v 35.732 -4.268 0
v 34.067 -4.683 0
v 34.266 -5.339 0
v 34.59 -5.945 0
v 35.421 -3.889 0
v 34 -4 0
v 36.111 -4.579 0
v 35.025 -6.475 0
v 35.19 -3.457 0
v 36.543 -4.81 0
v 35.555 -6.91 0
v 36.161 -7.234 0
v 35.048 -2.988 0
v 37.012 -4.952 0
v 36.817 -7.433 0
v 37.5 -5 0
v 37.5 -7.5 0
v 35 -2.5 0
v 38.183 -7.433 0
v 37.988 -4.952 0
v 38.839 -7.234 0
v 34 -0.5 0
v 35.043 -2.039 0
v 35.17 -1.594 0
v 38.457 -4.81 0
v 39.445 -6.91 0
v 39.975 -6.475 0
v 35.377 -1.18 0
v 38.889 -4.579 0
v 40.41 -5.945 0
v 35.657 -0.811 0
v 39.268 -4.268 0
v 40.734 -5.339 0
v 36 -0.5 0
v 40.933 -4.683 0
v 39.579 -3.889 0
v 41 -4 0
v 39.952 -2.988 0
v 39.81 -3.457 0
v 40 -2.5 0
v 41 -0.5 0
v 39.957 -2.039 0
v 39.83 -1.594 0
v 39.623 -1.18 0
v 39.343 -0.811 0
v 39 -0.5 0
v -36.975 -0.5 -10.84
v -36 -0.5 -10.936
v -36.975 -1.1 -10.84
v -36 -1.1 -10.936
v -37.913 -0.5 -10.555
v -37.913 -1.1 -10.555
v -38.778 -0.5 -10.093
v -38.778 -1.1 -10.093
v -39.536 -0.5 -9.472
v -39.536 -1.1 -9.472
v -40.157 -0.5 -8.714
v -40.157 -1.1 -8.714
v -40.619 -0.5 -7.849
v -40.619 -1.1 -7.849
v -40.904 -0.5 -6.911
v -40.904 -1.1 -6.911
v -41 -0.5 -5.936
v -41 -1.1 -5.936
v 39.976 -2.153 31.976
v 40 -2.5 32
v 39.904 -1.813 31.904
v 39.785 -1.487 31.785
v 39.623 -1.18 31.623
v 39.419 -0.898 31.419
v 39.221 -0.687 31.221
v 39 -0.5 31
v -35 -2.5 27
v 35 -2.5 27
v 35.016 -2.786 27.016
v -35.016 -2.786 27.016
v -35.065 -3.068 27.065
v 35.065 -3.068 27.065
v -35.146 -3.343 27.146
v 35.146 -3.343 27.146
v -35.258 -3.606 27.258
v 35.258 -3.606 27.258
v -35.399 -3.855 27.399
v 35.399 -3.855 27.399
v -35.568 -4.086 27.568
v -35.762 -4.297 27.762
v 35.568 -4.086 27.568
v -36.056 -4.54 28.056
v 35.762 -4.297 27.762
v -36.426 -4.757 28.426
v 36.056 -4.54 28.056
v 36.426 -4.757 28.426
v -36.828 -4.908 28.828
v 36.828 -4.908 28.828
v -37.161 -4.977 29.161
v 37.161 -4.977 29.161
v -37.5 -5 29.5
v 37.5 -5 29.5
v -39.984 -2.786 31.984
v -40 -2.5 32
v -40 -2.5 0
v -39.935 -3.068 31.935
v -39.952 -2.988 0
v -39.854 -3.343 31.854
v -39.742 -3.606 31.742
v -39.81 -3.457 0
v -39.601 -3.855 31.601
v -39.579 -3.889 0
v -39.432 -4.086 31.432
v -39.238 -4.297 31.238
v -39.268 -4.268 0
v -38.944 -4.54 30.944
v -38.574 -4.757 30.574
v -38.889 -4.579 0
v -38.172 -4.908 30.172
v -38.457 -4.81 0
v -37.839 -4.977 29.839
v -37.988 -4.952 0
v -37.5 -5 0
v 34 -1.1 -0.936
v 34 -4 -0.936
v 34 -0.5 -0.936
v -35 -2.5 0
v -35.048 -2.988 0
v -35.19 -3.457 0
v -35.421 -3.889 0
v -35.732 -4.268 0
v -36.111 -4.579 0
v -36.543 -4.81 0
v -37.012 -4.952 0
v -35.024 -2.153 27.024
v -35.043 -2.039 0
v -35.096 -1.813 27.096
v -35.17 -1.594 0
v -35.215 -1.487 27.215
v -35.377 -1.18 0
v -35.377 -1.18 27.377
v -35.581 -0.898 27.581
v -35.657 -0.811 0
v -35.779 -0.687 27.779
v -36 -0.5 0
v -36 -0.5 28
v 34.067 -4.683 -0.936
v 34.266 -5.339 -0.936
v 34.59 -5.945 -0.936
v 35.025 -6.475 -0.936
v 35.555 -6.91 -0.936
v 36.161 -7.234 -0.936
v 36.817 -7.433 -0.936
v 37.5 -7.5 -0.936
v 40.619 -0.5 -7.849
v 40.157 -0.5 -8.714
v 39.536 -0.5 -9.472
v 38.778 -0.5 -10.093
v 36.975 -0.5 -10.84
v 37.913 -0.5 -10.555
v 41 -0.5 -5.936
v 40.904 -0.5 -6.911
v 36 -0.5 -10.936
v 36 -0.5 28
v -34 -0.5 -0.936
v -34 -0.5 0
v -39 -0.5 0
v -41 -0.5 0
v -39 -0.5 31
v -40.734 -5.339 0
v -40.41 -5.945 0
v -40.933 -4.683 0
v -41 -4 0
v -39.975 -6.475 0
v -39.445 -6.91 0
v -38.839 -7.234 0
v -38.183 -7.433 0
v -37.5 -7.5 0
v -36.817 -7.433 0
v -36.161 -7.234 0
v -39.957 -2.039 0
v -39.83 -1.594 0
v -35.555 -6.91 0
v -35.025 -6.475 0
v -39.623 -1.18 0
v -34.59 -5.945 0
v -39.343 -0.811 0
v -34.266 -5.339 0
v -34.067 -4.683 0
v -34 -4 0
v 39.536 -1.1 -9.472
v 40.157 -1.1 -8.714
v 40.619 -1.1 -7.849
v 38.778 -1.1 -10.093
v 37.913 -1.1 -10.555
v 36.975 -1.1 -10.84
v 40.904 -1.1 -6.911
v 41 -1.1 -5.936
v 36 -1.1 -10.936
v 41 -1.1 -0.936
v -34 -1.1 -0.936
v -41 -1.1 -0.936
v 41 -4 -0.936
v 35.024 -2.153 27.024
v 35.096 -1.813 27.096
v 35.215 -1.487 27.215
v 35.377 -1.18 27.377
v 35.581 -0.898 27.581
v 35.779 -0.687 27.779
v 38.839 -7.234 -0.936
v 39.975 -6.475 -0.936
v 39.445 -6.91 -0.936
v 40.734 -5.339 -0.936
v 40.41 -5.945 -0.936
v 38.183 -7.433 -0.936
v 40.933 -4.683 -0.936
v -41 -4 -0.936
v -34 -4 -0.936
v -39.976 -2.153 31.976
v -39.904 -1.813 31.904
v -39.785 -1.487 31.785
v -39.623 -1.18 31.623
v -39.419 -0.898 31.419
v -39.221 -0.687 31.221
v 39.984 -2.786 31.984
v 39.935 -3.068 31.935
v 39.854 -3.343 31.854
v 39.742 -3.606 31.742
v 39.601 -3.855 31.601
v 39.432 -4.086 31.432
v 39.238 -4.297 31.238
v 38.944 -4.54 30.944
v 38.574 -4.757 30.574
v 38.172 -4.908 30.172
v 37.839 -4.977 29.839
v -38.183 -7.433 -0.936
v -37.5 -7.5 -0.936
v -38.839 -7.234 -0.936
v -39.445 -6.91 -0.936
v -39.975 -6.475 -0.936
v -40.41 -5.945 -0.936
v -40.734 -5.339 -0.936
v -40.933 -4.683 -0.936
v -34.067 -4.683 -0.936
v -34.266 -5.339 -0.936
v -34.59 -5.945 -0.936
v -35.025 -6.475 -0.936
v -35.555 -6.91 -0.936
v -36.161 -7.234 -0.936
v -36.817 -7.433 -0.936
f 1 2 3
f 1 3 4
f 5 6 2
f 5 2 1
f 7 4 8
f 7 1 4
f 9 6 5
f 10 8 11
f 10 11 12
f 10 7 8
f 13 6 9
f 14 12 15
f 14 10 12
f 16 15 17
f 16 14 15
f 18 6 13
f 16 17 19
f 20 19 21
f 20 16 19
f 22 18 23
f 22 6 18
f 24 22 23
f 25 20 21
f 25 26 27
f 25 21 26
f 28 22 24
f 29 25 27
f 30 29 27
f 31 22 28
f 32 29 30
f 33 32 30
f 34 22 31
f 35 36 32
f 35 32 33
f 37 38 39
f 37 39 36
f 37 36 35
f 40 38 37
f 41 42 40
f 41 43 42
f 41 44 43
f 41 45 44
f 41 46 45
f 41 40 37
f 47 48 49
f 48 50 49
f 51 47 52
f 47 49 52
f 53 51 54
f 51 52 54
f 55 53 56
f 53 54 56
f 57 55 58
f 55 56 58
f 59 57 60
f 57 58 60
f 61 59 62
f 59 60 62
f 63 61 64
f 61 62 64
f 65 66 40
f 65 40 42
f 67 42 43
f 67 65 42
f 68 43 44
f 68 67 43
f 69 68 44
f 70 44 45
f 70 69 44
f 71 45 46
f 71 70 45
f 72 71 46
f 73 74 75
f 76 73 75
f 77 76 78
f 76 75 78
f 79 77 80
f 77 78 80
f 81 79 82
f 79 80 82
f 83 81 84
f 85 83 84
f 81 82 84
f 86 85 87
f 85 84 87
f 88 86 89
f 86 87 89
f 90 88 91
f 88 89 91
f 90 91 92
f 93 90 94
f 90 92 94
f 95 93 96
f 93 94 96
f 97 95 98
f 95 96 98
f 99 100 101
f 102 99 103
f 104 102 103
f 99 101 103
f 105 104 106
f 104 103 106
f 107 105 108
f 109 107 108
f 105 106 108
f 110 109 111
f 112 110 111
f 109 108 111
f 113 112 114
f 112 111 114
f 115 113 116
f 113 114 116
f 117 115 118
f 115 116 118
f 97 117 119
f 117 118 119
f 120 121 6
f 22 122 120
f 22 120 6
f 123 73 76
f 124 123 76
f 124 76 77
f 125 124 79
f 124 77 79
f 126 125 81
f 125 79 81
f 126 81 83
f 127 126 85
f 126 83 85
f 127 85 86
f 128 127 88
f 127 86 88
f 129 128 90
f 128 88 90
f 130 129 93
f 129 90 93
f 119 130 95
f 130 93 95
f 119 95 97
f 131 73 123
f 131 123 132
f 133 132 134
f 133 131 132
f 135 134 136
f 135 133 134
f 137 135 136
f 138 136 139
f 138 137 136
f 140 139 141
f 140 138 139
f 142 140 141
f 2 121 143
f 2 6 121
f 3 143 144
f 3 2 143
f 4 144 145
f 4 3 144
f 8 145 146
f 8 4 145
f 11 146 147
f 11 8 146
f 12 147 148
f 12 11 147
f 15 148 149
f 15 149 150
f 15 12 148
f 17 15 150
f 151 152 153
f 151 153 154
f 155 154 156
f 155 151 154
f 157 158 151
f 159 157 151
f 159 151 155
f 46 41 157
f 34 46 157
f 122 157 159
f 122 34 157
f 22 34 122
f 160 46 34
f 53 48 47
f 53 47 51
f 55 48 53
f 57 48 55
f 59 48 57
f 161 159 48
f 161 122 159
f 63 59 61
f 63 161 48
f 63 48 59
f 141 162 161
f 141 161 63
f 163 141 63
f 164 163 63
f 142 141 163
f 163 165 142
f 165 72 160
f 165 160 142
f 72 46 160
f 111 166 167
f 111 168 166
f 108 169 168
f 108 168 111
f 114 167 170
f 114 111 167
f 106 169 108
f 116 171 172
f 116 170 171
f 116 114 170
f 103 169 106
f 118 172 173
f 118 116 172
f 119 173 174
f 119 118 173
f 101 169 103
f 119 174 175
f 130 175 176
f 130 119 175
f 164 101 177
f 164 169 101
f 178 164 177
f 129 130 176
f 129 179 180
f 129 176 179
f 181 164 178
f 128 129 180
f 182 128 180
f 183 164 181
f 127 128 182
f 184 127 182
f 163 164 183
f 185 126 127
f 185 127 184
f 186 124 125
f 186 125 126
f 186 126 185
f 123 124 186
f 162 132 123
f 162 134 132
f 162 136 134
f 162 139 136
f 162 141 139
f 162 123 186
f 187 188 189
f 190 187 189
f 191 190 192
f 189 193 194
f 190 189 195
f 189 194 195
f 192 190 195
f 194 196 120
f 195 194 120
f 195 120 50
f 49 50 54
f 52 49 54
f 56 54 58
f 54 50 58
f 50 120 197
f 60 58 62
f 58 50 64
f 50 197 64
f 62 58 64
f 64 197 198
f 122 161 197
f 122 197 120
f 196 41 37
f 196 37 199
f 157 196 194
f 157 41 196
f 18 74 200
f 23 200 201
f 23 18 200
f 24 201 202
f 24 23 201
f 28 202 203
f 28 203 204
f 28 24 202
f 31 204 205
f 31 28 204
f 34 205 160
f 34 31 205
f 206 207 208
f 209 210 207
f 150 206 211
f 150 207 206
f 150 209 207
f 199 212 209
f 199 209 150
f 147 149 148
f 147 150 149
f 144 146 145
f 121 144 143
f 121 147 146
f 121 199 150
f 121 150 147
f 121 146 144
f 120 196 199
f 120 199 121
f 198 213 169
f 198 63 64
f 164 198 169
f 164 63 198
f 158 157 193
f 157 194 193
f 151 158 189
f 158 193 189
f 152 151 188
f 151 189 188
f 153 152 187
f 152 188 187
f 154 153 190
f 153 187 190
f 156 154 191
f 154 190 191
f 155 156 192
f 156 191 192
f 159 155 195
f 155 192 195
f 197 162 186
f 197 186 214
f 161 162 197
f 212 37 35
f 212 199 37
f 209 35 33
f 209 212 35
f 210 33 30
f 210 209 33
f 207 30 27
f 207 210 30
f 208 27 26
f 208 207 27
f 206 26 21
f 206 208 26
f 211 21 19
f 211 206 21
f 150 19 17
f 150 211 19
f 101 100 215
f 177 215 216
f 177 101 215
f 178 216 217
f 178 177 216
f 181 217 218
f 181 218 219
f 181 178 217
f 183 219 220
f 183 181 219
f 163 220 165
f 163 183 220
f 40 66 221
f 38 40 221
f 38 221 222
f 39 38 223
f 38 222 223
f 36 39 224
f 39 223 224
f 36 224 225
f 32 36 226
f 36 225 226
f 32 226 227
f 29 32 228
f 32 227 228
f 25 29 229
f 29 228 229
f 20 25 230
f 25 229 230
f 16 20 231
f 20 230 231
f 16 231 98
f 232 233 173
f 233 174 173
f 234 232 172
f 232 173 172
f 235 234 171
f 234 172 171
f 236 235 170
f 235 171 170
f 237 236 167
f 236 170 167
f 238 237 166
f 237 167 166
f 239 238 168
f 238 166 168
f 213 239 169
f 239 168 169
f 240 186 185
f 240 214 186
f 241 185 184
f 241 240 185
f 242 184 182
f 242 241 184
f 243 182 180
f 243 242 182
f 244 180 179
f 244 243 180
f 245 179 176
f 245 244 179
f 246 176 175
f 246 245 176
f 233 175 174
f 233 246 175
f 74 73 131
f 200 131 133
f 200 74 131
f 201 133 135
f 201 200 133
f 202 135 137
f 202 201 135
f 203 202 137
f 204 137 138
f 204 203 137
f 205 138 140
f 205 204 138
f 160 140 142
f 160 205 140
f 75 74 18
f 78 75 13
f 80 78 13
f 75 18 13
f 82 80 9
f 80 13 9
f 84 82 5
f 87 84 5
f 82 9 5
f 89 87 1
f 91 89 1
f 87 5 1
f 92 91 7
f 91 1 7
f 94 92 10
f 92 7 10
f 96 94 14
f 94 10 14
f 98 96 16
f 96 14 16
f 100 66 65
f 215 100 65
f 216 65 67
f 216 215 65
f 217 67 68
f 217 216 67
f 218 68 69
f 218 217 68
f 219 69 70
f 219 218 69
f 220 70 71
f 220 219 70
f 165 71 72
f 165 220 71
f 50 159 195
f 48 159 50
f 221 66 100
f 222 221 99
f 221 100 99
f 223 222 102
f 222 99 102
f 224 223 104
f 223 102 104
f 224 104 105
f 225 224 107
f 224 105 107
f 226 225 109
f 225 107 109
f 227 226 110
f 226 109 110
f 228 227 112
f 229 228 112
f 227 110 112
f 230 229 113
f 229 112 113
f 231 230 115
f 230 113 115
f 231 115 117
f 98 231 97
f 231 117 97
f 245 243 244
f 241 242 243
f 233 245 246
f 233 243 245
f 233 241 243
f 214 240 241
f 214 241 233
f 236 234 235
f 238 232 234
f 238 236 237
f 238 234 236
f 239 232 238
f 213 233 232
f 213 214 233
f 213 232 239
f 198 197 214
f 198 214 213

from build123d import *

# Parameters (mm, degrees)
F2_DEPTH = 5
F3_R     = 2.49999
F4_W     = 80
F4_H     = 32
F5_DEPTH = 0.5
F7_DEPTH = 7
F8_DEPTH = 0.6
F9_R     = 3.49999
F10_R    = 5


# Not quite as in the source:
# - a fillet or chamfer is up to 0.001 mm smaller than in the source, because OpenCascade refuses the exact size


with BuildPart() as f2:
    # F1 (on Front) → F2 (new body)
    with BuildSketch(Plane.XZ):
        Polygon((-40, 32), (-40, 0), (-35, 0), (-35, 27), (35, 27), (35, 0), (40, 0), (40, 32), align=None)
    extrude(amount=F2_DEPTH)

    # F3 (radius 2.5 in the source; OpenCascade refuses exactly that, so slightly less here)
    f3_edges = [f2.edges().sort_by_distance(p)[0] for p in [
        (-35, -5, 13.5),
        (-35, 0, 13.5),
        (40, -5, 16),
        (40, 0, 16),
        (35, -5, 13.5),
        (35, 0, 13.5),
        (0, 0, 27),
        (0, 0, 32),
        (-40, 0, 16),
        (0, -5, 32),
        (-40, -5, 16),
        (0, -5, 27),
    ]]
    fillet(f3_edges, radius=F3_R)

    # F4 (on Front) → F5 (cut)
    with BuildSketch(Plane.XZ):
        with Locations((0, 16)):
            Rectangle(F4_W, F4_H)
    extrude(amount=F5_DEPTH, mode=Mode.SUBTRACT)

    # F6 (on face) → F7 (join)
    with BuildSketch(Plane(origin=(0, -0.5, 0), x_dir=(-1, 0, 0), z_dir=(0, 1, 0))):
        Polygon((-35.9999933333, 0), (-37.5, 0), (-39.0000066667, 0), (-41, 0), (-41, -0.936), (-34, -0.936), (-34, 0), align=None)
        Polygon((41, 0), (39.0000066667, 0), (37.5, 0), (35.9999933333, 0), (34, 0), (34, -0.936), (41, -0.936), align=None)
    extrude(amount=-F7_DEPTH)

    # F6 (on face) → F8 (join)
    with BuildSketch(Plane(origin=(0, -0.5, 0), x_dir=(-1, 0, 0), z_dir=(0, 1, 0))):
        Polygon((-34, -0.936), (-41, -0.936), (-41, -10.936), (0, -10.936), (41, -10.936), (41, -0.936), (34, -0.936), (0, -0.936), align=None)
    extrude(amount=-F8_DEPTH)

    # F9 (radius 3.5 in the source; OpenCascade refuses exactly that, so slightly less here)
    f9_edges = [f2.edges().sort_by_distance(p)[0] for p in [
        (41, -7.5, -0.468),
        (34, -7.5, -0.468),
        (-34, -7.5, -0.468),
        (-41, -7.5, -0.468),
    ]]
    fillet(f9_edges, radius=F9_R)

    # F10
    f10_edges = [f2.edges().sort_by_distance(p)[0] for p in [
        (41, -0.8, -10.936),
        (-41, -0.8, -10.936),
    ]]
    fillet(f10_edges, radius=F10_R)


solid = f2.part
